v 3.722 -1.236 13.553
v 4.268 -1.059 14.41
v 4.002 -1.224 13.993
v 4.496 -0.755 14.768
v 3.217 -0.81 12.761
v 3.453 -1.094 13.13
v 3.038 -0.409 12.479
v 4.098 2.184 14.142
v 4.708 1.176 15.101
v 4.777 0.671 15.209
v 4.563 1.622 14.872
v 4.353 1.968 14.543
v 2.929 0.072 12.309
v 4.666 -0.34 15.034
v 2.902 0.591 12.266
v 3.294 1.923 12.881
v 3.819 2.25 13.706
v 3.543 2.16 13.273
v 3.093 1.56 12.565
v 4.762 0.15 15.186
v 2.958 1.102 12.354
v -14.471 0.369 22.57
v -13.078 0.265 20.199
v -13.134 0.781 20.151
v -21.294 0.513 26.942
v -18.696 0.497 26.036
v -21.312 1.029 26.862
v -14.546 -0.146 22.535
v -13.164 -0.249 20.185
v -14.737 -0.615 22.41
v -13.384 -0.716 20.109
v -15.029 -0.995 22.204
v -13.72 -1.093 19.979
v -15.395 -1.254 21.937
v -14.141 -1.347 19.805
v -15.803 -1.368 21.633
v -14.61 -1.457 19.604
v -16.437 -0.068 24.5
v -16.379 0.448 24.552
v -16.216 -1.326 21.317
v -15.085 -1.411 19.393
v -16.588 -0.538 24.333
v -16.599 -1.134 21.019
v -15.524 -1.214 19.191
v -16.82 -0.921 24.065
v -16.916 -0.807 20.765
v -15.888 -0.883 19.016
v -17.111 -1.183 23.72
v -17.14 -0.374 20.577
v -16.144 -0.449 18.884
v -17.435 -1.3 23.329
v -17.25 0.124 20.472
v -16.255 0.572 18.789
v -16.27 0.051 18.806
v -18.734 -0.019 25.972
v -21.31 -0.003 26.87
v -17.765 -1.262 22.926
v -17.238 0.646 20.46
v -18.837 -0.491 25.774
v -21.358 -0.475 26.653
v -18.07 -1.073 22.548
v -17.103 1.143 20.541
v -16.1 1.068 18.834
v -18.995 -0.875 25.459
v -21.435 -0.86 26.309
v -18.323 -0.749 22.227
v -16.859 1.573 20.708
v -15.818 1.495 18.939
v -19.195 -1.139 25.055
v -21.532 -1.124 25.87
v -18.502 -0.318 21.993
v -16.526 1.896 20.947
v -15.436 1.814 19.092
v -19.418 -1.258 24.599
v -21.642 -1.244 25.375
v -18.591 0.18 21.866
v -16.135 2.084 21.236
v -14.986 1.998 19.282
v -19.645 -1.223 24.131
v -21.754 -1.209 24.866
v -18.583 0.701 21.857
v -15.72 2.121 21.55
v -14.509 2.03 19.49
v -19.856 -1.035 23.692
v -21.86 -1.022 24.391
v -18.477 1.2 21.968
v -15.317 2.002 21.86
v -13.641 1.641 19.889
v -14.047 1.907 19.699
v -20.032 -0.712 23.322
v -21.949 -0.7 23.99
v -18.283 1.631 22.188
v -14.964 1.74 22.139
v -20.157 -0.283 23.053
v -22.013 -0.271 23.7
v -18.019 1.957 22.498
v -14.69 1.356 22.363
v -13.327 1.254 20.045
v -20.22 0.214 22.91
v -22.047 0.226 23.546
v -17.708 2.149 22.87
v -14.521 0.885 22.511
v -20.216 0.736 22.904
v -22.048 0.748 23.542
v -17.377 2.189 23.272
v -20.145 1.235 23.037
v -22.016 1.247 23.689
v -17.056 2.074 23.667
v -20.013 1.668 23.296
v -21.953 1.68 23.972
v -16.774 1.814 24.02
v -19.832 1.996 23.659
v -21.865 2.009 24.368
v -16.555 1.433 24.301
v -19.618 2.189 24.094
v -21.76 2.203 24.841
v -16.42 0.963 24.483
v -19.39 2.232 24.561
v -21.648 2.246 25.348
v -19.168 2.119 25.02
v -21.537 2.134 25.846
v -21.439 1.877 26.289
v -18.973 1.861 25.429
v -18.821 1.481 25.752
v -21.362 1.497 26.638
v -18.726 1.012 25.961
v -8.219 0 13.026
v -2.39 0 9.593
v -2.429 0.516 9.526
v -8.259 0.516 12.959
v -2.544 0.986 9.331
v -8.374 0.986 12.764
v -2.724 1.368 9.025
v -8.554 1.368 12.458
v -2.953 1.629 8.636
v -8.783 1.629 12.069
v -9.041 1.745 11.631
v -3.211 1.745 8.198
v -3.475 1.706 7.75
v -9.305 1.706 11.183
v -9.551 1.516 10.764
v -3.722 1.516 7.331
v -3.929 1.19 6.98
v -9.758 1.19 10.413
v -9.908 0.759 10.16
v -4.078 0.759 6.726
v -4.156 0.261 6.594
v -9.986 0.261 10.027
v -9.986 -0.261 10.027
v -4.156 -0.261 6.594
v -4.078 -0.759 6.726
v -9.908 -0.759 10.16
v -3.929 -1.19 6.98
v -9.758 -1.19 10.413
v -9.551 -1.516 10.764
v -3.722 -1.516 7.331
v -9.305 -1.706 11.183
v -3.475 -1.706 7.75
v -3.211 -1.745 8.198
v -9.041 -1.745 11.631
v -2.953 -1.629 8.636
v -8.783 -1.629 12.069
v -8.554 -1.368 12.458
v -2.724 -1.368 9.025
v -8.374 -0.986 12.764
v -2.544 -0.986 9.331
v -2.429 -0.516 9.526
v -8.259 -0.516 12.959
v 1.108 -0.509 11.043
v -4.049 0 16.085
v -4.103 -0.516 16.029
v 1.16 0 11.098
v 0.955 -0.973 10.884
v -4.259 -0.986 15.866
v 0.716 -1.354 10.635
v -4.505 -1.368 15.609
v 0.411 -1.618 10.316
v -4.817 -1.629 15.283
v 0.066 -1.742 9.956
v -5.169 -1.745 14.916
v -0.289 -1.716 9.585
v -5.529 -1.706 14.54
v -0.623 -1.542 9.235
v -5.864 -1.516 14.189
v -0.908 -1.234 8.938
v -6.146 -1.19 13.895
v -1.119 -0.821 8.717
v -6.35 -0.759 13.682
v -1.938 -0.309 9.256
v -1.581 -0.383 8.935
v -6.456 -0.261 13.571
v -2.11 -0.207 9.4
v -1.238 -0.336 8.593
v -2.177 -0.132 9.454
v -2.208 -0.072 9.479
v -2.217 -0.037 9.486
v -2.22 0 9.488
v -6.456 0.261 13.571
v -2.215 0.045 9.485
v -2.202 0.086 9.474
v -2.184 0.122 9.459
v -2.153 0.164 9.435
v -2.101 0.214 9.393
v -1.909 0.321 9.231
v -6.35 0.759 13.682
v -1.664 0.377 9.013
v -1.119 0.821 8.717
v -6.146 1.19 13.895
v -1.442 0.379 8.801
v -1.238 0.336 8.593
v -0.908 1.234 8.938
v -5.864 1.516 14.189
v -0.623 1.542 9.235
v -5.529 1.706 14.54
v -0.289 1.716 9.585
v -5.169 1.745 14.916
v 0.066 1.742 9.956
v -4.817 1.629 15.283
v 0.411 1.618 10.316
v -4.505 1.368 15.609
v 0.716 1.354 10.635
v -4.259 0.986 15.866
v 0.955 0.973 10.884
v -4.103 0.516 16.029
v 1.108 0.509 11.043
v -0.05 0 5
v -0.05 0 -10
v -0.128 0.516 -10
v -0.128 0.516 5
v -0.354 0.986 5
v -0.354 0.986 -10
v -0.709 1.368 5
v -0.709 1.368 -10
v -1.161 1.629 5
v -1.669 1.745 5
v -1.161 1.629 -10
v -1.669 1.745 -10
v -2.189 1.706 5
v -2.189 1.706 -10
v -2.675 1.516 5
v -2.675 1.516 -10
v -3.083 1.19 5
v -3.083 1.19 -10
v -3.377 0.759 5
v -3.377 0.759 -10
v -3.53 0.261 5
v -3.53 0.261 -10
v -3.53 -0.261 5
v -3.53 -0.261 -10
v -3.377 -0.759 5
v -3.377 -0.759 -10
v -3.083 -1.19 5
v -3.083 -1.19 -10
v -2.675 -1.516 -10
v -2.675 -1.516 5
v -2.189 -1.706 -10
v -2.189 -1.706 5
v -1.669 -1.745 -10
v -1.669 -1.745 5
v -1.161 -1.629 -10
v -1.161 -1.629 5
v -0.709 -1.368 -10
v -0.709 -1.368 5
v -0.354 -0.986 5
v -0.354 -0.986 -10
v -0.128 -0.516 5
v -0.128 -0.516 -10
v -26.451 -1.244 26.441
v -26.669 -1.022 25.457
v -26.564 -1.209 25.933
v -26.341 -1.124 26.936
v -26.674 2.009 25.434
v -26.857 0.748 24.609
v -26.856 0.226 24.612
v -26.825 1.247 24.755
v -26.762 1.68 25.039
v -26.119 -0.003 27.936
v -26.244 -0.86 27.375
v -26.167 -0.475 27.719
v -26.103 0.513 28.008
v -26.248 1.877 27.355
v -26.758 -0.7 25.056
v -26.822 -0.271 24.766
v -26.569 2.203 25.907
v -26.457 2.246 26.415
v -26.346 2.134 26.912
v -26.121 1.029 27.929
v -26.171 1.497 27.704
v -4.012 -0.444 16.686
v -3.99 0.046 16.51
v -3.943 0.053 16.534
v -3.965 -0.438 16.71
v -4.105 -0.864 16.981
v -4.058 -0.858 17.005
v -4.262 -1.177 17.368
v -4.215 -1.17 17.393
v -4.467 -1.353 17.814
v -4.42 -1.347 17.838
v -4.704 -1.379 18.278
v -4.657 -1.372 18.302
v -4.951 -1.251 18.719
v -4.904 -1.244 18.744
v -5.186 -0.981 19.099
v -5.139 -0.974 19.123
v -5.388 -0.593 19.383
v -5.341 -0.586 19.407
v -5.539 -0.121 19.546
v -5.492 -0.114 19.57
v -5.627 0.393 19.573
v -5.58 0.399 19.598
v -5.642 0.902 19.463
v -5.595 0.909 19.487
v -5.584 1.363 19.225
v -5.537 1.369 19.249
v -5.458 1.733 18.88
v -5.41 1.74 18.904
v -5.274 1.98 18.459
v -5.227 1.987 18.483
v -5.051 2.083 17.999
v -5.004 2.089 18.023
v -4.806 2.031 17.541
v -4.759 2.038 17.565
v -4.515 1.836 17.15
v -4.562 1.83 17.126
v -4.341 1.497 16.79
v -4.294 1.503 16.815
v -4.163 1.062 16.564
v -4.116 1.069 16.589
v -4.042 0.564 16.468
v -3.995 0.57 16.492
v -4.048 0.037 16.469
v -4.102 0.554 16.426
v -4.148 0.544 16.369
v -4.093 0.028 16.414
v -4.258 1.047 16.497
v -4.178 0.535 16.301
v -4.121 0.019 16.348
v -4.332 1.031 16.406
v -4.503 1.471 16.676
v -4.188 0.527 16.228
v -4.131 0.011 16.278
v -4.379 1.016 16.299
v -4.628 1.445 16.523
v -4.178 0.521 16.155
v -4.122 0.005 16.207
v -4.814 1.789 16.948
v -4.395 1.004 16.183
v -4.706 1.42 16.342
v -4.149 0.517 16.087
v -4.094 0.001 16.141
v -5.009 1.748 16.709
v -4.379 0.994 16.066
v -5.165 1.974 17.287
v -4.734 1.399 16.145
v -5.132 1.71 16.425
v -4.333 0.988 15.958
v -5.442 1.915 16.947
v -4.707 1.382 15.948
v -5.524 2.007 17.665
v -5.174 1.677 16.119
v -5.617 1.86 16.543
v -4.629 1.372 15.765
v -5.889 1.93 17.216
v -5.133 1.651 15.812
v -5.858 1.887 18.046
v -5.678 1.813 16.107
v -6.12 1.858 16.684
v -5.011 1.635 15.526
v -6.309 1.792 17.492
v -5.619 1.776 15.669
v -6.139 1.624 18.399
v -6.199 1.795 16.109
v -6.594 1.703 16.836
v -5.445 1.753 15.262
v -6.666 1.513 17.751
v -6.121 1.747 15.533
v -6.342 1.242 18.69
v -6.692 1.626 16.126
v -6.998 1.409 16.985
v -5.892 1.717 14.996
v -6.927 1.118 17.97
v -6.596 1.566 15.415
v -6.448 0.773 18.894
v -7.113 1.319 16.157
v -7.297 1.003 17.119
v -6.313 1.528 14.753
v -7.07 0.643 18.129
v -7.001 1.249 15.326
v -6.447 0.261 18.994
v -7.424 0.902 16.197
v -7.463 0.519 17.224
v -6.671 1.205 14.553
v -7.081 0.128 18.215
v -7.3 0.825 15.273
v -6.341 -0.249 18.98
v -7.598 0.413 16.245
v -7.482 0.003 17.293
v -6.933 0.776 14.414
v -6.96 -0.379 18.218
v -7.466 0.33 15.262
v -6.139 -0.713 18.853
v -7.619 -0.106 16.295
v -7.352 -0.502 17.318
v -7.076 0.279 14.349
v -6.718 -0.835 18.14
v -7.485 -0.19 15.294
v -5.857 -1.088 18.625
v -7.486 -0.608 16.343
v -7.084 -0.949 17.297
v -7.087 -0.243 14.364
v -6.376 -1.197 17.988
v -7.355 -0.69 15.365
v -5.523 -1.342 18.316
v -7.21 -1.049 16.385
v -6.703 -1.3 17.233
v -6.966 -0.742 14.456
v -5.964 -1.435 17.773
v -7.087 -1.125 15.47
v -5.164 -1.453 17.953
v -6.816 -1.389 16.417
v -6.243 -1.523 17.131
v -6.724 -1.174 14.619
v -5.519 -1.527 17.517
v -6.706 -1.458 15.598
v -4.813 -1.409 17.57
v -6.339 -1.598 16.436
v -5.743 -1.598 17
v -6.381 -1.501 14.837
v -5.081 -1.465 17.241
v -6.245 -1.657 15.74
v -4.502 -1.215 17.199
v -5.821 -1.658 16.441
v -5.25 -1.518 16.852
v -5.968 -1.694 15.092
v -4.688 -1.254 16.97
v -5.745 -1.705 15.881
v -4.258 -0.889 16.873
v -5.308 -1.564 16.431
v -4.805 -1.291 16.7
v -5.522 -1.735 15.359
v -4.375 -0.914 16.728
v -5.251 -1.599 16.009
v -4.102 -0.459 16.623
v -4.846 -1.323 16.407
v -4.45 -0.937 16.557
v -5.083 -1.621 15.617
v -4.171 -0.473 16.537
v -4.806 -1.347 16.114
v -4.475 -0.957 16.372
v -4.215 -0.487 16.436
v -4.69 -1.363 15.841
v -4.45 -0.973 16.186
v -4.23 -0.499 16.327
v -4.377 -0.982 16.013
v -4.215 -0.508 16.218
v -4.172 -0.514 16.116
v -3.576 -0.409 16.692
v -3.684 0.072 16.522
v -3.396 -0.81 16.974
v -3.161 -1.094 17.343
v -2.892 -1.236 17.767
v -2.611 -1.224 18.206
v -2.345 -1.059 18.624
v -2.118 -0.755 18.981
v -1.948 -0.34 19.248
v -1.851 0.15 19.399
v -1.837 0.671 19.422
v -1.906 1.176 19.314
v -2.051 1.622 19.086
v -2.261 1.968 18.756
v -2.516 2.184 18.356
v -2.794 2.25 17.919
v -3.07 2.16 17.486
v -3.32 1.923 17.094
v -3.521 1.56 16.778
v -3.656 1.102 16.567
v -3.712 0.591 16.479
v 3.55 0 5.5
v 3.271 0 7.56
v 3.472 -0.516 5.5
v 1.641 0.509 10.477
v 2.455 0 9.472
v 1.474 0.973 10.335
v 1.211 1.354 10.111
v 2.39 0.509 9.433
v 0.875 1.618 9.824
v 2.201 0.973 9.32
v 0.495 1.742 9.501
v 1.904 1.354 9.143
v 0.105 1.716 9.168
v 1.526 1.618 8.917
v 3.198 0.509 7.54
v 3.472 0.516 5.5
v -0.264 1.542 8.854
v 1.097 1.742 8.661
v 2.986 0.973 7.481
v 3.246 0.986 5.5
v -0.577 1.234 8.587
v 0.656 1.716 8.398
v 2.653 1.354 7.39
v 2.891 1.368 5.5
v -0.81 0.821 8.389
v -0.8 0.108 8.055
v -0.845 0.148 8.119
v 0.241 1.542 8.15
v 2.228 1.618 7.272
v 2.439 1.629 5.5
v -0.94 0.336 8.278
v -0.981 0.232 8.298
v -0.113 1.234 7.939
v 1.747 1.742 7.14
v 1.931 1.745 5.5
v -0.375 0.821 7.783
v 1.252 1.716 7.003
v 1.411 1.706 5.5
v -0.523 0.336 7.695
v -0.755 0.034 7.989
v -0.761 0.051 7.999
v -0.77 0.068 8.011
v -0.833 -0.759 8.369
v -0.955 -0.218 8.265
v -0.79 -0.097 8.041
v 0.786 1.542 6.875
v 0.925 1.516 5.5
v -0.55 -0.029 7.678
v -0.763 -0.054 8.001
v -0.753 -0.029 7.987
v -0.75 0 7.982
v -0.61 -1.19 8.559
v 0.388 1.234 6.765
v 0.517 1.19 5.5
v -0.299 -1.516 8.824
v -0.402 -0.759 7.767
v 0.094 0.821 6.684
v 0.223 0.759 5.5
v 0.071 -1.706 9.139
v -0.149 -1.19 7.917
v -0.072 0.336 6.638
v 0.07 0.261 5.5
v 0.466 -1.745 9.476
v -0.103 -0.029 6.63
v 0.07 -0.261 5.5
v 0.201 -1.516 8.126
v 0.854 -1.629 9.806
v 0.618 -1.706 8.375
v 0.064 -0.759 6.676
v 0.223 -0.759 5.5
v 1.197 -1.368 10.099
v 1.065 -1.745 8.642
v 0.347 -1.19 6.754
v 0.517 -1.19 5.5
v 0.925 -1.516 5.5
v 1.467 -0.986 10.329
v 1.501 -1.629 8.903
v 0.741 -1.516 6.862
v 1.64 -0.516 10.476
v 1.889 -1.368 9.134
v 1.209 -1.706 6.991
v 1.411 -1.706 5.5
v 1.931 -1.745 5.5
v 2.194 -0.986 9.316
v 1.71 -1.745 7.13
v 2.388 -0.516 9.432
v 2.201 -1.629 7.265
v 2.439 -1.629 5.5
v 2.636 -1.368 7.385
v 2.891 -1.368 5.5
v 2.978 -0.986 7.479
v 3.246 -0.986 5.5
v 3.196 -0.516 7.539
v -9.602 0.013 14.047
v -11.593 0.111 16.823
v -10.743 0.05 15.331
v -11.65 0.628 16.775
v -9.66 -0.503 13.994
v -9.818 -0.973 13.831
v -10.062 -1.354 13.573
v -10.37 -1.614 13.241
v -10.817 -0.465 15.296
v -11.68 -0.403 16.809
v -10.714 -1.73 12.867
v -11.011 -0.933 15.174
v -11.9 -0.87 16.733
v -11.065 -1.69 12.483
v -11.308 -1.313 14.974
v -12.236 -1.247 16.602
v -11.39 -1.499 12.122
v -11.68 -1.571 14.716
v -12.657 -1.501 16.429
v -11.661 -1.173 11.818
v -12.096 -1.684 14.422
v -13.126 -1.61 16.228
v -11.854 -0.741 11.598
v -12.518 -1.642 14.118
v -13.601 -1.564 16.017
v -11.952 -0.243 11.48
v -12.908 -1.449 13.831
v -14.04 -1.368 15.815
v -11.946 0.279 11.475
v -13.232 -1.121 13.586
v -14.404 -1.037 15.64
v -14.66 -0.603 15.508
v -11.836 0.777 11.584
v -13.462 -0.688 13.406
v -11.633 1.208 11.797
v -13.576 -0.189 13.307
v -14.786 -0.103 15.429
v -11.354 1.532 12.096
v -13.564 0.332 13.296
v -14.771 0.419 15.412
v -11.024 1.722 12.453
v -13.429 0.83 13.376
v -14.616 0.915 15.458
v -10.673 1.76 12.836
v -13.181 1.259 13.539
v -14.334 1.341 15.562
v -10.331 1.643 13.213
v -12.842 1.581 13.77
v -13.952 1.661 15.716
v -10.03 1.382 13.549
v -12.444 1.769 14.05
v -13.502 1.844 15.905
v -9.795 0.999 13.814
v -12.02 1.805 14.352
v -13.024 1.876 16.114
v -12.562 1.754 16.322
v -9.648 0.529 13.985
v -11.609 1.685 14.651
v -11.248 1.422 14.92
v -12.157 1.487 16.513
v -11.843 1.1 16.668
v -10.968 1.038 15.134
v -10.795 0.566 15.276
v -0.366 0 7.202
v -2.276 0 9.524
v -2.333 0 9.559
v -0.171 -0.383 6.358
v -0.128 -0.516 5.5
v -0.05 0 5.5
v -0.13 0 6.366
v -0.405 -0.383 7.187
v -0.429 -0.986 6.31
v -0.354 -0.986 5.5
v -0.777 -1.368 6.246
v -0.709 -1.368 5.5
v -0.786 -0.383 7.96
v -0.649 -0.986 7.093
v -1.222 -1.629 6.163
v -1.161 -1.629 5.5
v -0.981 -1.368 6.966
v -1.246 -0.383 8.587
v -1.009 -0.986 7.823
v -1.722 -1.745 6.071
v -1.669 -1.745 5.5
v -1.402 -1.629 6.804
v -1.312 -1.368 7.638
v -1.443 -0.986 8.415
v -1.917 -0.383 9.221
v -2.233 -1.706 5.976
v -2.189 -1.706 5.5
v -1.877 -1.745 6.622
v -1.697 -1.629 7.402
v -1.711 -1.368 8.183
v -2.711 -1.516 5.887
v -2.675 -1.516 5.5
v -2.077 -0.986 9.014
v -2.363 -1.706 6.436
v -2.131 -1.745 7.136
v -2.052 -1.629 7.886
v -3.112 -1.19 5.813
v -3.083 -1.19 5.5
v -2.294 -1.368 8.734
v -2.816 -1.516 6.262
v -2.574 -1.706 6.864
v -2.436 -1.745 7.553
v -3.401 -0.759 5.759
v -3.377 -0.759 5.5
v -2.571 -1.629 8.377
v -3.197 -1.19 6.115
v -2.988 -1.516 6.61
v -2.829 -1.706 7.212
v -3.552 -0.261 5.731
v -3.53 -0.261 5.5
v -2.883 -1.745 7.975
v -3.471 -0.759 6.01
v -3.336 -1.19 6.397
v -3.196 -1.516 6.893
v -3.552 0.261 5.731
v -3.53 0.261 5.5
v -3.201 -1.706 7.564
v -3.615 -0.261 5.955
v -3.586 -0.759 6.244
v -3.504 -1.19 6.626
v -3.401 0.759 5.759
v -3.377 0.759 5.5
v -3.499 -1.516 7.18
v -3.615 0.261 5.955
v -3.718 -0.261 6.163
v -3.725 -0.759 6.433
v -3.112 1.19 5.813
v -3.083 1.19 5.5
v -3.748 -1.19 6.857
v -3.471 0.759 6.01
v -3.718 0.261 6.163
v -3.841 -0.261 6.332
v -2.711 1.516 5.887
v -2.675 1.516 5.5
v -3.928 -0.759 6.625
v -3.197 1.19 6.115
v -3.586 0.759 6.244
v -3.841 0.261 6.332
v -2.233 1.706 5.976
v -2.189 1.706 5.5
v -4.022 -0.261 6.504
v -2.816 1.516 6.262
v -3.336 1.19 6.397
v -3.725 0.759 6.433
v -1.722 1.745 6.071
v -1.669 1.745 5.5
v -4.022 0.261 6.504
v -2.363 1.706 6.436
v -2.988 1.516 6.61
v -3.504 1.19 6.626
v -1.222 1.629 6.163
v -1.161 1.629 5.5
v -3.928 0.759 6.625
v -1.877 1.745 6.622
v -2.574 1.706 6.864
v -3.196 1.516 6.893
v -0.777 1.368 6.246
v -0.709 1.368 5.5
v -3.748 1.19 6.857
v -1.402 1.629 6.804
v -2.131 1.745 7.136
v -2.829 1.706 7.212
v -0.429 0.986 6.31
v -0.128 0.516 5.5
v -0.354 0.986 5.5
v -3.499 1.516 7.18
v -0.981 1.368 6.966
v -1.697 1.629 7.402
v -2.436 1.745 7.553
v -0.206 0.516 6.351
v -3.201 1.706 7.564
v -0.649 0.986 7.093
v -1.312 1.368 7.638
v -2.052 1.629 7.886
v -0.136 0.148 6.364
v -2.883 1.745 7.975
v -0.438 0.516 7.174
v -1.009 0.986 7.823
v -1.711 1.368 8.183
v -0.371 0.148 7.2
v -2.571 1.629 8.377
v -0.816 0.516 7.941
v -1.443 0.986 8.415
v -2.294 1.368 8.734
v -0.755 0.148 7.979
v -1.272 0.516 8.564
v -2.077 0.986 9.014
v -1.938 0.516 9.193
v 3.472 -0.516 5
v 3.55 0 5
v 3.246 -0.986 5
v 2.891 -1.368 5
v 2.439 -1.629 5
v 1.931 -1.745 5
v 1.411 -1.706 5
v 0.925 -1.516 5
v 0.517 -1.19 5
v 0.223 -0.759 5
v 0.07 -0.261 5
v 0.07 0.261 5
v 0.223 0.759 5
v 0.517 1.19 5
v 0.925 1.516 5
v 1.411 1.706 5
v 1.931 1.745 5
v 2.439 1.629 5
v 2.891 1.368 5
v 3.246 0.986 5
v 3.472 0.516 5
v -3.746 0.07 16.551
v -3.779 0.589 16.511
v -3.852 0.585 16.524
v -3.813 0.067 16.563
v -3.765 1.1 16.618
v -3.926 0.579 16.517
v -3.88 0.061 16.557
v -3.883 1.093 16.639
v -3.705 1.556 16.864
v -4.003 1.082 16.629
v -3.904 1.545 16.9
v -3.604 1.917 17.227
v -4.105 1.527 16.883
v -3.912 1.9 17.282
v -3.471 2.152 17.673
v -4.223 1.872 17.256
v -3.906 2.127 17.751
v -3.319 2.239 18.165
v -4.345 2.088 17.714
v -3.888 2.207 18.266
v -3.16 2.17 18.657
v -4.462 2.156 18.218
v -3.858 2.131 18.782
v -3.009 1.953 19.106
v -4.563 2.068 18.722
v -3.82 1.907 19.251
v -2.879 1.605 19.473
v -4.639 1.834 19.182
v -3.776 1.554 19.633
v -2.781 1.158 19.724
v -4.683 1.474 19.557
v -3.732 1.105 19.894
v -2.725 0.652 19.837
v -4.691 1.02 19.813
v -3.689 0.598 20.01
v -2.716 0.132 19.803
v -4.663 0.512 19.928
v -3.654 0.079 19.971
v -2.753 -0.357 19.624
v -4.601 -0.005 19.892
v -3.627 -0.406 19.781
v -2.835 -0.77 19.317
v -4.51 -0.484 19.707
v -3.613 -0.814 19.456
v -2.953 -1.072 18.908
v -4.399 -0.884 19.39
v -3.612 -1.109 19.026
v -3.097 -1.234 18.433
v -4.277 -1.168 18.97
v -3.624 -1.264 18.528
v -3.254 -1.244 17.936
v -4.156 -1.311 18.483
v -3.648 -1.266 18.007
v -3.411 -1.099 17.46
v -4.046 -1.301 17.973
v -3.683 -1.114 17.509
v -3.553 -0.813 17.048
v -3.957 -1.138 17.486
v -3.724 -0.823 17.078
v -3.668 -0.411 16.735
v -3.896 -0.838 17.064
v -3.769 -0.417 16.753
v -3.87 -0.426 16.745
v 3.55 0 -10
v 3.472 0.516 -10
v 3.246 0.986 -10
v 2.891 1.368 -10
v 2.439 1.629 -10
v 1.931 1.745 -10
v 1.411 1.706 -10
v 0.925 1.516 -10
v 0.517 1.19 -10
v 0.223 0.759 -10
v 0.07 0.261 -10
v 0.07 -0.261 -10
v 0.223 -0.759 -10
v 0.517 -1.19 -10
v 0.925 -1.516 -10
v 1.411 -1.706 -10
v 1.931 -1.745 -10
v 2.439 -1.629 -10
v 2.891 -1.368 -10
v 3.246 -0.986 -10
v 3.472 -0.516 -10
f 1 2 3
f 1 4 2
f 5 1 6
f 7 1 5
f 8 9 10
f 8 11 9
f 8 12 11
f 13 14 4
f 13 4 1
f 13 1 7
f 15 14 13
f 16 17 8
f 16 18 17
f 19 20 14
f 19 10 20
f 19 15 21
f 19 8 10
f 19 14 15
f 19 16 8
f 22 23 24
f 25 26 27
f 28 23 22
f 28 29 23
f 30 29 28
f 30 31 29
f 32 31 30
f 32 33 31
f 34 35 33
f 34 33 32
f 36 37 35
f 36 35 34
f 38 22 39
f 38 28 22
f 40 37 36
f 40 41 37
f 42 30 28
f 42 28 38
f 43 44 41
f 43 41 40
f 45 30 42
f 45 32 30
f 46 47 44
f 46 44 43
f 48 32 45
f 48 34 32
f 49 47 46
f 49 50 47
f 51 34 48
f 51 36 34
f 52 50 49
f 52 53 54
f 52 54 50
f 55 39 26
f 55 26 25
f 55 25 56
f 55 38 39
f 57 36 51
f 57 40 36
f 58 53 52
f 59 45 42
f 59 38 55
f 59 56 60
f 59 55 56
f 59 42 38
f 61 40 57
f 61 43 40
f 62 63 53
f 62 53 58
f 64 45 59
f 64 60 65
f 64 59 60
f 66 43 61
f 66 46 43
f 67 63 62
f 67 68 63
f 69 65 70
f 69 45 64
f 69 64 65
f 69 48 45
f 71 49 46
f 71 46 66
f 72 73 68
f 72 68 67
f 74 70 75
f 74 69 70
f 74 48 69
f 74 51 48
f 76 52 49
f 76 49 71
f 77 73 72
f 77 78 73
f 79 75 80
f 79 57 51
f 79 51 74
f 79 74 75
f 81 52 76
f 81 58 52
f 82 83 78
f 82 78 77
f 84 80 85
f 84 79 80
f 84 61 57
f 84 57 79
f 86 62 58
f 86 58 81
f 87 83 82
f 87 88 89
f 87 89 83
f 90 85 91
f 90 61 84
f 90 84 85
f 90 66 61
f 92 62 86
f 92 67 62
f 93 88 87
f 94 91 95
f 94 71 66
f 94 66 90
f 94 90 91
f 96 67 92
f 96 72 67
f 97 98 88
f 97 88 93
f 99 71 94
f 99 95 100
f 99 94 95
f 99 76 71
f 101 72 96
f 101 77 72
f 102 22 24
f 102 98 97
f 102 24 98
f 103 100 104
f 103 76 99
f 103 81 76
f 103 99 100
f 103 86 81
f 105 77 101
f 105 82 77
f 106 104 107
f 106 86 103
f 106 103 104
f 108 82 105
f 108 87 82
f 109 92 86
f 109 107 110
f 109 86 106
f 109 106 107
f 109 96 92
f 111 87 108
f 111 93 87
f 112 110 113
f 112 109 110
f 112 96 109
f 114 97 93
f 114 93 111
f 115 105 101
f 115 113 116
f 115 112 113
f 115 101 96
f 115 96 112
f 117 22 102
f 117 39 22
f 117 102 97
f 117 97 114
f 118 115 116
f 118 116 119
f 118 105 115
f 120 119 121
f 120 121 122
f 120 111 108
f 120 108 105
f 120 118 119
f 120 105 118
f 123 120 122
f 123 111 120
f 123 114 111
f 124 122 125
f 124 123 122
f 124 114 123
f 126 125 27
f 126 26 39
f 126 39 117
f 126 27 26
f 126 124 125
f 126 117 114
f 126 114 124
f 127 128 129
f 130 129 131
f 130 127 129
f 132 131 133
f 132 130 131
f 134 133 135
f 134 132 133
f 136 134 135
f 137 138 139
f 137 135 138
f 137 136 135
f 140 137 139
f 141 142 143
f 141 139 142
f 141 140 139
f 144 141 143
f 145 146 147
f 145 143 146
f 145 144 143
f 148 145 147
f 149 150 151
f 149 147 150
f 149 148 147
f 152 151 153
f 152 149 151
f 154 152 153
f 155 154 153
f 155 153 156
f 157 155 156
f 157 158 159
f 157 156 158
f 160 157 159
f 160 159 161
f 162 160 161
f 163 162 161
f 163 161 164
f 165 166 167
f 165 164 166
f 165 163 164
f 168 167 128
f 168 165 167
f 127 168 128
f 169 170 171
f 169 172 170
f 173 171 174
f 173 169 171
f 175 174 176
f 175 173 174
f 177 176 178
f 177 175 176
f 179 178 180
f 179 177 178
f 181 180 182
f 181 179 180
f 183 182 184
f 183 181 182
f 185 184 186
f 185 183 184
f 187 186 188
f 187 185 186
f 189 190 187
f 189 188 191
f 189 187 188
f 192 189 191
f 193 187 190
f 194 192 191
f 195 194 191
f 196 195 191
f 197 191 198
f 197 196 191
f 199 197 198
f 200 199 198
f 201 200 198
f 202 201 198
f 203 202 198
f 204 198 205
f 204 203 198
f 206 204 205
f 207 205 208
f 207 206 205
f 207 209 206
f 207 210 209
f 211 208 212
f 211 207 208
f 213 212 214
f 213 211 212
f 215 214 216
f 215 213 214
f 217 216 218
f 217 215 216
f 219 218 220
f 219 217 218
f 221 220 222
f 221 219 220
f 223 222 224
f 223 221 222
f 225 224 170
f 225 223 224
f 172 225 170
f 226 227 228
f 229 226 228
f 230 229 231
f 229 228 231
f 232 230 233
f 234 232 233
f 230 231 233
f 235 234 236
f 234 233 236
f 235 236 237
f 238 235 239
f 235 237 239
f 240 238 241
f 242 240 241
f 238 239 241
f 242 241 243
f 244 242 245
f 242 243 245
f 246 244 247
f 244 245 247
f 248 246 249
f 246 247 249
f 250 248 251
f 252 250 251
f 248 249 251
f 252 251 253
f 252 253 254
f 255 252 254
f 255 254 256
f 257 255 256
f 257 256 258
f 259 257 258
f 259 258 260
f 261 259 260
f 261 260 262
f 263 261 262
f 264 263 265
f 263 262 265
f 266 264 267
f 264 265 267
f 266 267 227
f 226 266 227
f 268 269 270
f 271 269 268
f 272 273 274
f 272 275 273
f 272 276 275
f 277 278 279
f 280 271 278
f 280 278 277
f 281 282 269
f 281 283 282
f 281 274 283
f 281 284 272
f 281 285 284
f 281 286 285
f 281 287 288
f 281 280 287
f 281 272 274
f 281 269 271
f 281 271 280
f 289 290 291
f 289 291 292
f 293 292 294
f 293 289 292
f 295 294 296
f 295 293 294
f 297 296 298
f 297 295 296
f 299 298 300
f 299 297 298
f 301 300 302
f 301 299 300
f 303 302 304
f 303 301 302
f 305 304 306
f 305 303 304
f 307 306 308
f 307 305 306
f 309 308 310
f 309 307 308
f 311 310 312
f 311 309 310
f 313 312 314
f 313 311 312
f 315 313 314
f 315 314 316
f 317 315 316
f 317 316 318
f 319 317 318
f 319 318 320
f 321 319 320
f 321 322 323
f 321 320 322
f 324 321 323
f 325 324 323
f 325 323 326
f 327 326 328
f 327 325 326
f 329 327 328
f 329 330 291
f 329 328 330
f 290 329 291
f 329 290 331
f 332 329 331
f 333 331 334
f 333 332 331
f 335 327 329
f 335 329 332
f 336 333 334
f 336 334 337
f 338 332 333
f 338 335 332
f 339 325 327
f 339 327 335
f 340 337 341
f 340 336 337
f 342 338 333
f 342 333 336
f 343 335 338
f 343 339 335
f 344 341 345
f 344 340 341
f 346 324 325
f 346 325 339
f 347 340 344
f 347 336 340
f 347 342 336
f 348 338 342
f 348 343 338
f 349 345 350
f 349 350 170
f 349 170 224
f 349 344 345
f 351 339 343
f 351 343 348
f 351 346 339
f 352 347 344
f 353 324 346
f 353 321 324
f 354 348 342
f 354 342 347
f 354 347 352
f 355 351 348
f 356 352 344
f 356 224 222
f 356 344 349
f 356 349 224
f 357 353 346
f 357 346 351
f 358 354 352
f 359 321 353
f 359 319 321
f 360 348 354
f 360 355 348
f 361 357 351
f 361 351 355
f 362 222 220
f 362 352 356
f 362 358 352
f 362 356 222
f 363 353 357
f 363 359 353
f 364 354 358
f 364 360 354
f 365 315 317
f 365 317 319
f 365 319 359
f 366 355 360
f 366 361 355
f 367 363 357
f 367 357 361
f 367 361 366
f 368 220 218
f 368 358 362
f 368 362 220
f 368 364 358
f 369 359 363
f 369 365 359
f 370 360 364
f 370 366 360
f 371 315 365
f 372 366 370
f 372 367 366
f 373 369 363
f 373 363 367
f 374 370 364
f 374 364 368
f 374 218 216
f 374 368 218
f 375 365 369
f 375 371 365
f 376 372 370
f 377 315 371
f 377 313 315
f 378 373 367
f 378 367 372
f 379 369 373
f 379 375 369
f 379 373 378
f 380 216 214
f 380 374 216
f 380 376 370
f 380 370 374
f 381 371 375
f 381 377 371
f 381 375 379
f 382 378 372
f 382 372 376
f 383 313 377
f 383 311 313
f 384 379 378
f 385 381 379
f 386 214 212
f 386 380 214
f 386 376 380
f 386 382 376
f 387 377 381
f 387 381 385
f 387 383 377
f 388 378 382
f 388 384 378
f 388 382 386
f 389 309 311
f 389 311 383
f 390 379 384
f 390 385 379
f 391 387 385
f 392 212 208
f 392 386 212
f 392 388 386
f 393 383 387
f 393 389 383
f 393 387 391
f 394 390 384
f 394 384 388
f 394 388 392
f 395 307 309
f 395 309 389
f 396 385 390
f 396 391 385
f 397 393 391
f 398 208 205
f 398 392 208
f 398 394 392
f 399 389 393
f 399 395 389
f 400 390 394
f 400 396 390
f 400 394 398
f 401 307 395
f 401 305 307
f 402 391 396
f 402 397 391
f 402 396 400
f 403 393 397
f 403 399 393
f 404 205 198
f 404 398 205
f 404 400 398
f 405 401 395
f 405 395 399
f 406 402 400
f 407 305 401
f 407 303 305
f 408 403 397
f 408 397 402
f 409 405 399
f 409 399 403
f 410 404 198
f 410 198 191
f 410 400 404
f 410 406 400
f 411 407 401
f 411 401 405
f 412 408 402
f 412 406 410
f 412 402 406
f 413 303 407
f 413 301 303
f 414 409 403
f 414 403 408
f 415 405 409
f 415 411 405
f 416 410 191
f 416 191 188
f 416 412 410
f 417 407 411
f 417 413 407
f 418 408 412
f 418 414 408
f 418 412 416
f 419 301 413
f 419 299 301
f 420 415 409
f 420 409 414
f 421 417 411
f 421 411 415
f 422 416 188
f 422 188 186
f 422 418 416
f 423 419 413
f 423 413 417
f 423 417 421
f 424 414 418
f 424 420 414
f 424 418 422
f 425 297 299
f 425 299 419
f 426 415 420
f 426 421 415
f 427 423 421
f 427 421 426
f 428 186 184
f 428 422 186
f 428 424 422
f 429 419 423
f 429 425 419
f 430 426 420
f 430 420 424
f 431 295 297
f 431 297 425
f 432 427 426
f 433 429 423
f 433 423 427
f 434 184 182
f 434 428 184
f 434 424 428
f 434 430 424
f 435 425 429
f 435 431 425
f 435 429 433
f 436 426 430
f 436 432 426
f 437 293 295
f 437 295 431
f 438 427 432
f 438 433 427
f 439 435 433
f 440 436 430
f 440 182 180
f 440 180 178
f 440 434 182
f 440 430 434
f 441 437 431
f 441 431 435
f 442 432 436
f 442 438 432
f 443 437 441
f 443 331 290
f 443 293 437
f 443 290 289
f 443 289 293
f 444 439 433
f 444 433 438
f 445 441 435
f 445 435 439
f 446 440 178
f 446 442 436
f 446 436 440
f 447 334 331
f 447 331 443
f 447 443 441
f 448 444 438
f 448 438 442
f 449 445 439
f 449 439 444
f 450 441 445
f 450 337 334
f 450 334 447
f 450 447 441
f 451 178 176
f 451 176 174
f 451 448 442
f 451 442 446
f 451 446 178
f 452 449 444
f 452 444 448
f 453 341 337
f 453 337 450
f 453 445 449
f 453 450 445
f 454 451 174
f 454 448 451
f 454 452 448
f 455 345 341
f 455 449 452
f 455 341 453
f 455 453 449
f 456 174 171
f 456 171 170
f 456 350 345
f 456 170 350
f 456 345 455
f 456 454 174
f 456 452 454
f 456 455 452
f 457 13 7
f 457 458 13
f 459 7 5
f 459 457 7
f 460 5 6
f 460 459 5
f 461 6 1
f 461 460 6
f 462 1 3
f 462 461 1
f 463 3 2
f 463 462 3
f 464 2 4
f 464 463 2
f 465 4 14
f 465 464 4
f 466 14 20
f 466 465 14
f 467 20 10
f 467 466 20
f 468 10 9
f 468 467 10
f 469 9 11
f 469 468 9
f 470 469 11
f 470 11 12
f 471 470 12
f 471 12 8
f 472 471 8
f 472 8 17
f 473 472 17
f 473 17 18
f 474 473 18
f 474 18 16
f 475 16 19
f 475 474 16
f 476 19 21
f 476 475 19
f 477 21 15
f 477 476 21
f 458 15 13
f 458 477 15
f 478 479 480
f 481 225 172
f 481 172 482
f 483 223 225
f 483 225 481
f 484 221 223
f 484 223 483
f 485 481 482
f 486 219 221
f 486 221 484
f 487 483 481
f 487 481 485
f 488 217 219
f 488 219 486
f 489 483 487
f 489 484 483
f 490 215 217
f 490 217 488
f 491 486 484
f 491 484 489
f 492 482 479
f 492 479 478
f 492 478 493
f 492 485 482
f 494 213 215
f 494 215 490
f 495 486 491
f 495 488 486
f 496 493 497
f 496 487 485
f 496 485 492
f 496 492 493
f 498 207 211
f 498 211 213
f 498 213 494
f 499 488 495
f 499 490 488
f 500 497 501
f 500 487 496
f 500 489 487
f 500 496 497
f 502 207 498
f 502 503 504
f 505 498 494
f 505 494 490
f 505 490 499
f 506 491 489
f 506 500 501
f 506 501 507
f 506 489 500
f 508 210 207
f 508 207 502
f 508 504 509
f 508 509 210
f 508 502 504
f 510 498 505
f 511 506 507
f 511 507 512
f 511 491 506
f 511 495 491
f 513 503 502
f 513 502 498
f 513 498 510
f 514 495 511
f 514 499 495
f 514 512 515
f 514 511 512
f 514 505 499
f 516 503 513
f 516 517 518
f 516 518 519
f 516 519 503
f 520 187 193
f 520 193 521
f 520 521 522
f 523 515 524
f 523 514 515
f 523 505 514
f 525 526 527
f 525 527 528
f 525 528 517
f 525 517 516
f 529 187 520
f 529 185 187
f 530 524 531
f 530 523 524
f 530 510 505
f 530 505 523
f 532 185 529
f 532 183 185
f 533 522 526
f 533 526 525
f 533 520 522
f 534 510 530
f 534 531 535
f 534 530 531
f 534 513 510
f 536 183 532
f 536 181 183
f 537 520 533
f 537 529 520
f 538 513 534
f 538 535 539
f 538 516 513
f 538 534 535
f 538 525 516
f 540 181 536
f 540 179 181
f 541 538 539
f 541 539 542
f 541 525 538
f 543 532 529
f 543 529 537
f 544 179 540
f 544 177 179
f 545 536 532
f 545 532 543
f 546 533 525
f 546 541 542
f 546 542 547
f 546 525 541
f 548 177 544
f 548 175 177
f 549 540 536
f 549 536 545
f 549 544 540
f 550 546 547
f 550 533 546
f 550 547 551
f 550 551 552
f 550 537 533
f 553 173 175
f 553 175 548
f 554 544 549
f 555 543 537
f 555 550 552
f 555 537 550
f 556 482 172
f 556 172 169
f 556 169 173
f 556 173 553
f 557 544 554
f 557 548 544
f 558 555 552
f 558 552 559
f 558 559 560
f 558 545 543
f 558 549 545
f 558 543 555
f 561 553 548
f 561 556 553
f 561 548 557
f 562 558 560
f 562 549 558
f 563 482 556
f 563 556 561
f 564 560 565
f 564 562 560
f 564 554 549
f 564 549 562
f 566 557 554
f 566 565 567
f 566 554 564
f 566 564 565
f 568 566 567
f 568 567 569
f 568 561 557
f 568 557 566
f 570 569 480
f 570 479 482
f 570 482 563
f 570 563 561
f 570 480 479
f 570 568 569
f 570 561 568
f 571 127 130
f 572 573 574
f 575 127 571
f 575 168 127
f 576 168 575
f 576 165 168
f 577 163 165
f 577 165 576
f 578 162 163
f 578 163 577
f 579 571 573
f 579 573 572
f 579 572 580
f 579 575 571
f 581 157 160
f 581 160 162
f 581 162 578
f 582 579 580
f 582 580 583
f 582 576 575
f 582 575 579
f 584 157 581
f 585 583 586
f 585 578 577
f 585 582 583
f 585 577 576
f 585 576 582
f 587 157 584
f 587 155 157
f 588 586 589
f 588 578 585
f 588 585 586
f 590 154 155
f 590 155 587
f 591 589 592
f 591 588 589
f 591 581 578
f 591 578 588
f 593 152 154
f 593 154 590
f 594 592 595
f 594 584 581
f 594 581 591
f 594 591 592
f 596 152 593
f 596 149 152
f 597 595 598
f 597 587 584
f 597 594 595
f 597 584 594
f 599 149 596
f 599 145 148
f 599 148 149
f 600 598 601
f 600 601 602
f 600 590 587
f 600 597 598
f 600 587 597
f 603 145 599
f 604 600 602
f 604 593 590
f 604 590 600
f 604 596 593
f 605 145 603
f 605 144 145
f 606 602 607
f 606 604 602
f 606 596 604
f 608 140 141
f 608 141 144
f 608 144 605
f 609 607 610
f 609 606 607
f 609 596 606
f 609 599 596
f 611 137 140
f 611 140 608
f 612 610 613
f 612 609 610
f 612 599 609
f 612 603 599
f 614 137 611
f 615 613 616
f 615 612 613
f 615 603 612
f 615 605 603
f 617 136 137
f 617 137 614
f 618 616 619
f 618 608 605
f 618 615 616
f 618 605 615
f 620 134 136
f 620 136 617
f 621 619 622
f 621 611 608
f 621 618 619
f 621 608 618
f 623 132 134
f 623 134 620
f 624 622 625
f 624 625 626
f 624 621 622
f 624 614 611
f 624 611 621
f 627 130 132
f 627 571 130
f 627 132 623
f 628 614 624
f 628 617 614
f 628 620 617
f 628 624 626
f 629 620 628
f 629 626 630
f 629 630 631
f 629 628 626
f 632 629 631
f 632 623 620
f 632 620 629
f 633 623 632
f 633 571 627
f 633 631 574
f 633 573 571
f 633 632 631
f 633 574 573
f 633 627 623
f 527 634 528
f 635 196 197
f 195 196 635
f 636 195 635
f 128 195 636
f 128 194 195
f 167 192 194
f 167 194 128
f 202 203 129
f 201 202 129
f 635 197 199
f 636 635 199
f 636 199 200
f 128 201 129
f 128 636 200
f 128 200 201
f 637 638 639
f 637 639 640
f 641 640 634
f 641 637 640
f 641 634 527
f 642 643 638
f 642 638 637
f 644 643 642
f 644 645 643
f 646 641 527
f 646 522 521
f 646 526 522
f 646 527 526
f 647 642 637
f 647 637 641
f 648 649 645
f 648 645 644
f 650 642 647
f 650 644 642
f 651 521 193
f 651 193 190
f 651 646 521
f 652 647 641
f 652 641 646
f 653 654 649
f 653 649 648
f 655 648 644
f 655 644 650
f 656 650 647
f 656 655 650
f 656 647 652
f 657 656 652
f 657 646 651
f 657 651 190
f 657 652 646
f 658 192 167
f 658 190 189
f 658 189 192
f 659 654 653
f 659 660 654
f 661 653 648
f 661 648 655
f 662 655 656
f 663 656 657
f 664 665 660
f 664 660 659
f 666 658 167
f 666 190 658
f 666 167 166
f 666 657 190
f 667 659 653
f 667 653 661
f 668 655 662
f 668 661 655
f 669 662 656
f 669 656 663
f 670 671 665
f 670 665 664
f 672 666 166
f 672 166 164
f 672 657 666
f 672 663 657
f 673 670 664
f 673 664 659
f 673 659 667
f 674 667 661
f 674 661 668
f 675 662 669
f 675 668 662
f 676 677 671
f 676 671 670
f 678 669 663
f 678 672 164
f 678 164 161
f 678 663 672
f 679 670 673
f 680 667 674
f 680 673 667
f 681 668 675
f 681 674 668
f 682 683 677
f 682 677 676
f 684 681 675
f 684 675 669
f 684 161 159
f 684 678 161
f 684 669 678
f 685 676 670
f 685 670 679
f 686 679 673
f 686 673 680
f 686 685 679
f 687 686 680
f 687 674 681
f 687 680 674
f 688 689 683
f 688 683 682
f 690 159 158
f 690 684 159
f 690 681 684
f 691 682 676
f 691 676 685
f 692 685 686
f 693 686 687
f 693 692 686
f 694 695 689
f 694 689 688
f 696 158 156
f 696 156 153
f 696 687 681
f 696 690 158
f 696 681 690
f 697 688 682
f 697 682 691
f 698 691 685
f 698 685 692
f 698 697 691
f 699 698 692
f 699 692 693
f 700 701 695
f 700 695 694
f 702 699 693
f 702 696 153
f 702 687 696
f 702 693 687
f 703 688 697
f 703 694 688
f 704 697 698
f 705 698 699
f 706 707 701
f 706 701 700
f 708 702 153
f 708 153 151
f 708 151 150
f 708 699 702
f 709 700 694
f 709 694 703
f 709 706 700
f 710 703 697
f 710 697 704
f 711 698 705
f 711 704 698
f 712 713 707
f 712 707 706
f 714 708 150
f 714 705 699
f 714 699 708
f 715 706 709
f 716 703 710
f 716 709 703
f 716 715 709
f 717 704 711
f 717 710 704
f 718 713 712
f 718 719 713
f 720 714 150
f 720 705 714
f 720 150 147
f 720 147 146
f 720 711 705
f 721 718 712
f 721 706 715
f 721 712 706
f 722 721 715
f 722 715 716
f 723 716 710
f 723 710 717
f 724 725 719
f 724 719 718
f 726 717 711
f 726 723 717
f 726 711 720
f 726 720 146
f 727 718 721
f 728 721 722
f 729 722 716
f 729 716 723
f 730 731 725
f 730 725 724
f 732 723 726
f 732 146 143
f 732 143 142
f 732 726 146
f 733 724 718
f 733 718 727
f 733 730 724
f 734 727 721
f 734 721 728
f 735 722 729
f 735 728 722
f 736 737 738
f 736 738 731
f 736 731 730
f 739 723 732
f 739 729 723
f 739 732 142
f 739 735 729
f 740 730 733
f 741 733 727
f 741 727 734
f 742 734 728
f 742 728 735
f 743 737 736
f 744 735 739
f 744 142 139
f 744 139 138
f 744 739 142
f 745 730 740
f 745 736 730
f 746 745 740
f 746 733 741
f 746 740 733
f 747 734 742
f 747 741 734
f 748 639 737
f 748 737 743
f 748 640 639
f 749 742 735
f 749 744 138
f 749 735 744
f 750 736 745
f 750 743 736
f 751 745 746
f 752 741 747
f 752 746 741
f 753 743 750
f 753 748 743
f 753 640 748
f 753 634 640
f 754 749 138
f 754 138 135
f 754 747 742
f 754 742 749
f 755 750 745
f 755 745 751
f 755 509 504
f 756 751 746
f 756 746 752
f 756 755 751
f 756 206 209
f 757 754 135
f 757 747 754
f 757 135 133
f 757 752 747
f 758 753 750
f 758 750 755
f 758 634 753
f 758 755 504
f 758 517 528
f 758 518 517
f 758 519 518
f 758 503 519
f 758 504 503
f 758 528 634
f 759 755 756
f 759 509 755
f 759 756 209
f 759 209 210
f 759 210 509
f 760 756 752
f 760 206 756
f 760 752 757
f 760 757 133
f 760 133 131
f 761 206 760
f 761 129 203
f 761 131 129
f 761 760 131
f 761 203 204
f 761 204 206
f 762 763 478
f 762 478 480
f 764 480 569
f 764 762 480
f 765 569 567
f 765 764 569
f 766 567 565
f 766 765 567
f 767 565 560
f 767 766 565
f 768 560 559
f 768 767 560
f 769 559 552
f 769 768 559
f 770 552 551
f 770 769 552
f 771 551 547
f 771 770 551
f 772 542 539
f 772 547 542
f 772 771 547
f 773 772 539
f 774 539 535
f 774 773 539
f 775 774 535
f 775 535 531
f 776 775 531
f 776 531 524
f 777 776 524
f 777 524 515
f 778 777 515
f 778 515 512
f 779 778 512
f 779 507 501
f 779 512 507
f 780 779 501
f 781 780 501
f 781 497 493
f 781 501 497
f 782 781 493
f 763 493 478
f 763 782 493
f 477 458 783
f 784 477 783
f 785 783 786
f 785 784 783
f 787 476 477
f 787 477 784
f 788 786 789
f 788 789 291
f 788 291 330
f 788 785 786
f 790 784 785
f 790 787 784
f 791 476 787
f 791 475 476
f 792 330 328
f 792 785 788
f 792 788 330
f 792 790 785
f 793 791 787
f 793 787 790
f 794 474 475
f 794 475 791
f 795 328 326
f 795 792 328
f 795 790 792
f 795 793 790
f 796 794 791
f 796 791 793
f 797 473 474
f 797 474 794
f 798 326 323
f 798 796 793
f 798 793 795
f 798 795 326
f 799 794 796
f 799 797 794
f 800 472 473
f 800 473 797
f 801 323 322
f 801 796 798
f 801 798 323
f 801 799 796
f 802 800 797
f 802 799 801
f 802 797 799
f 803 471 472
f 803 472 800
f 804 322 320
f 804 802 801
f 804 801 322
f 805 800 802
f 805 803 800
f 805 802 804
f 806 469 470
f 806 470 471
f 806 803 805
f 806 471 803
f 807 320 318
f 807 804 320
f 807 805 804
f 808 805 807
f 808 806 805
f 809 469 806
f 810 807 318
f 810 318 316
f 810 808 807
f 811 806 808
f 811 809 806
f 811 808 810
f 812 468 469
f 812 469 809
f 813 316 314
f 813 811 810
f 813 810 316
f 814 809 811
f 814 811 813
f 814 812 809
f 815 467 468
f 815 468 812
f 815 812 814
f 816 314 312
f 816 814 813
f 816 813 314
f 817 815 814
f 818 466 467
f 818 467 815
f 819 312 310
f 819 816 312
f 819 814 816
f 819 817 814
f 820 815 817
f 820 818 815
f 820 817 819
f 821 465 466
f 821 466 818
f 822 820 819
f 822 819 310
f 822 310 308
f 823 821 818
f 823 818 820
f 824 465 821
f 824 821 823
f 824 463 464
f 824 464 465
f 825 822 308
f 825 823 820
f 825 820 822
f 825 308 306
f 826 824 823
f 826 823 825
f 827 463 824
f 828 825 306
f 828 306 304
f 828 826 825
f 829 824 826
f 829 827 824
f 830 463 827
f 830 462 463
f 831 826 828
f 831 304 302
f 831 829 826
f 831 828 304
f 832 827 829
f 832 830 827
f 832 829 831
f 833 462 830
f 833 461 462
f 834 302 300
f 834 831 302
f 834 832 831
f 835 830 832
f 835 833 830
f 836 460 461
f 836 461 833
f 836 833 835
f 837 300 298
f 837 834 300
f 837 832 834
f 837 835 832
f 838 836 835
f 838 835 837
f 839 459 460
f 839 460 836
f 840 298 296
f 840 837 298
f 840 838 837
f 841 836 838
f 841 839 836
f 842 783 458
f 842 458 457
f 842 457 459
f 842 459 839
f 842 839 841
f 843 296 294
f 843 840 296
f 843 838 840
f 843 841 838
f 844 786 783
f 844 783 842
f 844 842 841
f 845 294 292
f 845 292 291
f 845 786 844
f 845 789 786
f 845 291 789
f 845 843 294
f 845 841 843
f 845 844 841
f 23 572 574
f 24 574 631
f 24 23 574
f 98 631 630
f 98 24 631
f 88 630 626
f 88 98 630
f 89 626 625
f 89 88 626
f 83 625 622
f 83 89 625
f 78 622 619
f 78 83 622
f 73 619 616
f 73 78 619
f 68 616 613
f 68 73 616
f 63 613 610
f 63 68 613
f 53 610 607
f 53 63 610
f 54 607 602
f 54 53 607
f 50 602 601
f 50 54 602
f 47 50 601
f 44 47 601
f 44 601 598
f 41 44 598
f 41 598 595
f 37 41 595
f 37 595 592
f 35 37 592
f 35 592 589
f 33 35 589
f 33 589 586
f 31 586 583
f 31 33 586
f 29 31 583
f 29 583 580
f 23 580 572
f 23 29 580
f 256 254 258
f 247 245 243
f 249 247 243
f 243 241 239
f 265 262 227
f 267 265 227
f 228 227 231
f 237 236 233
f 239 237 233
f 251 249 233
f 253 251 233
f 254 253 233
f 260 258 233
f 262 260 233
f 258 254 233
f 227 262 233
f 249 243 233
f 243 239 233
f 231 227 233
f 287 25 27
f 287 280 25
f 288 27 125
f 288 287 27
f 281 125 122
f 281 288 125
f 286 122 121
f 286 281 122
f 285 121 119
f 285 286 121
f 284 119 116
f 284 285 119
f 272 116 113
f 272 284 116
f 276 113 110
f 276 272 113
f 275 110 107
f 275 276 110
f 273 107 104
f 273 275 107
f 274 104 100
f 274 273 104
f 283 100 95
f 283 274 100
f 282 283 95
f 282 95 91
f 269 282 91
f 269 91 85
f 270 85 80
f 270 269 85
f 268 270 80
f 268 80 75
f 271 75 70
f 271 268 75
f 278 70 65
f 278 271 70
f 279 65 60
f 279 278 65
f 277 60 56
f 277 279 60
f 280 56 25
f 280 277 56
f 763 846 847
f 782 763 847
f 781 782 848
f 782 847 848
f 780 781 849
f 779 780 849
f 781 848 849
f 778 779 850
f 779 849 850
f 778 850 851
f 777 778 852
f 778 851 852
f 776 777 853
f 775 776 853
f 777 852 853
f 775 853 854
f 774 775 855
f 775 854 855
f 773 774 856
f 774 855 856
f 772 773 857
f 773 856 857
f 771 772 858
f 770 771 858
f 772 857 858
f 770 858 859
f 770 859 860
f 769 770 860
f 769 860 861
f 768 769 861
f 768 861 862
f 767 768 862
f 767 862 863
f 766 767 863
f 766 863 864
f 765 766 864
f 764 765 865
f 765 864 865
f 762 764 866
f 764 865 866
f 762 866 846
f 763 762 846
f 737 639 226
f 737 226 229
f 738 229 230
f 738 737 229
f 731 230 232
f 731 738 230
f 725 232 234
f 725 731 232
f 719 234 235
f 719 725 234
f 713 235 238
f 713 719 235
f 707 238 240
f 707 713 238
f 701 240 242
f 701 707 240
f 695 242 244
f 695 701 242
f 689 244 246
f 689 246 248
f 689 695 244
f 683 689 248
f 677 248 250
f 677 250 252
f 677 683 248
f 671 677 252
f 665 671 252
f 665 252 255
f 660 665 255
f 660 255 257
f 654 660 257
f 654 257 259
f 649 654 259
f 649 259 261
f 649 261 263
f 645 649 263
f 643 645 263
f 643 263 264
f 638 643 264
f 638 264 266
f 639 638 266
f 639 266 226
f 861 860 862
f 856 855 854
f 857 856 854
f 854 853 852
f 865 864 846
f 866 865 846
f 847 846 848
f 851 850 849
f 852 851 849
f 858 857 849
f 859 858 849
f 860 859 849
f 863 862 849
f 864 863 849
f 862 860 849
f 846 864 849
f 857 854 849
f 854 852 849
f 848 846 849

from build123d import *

# Parameters (mm, degrees)
BOSS_EXTRU_1_DEPTH        = 5
BOSS_EXTRU_1_DEPTH_BACK   = 10
ESQUISSE1_R               = 1.75
BOSS_EXTRU_1_2_DEPTH      = 5
BOSS_EXTRU_1_2_DEPTH_BACK = 10
ESQUISSE2_R               = 1.75
ESQUISSE3_R               = 1.75
ENL_V_MAT_EXTRU_1_DEPTH   = 3
ESQUISSE4_R               = 1.75
ESQUISSE5_R               = 1.75
ENL_V_MAT_EXTRU_2_DEPTH   = 3


with BuildPart() as part:
    # Esquisse1 → Boss.-Extru.1 (new, two sides: drawn at the far end of the back side and taken through both)
    with BuildSketch(Plane.XY.offset(-BOSS_EXTRU_1_DEPTH_BACK)):
        with Locations((-1.8, 0)):
            Circle(ESQUISSE1_R)
    extrude(amount=BOSS_EXTRU_1_DEPTH + BOSS_EXTRU_1_DEPTH_BACK)



with BuildPart() as body_2:
    # Esquisse1 → Boss.-Extru.1 2 (new, two sides: drawn at the far end of the back side and taken through both)
    with BuildSketch(Plane.XY.offset(-BOSS_EXTRU_1_2_DEPTH_BACK)):
        with Locations((1.8, 0)):
            Circle(ESQUISSE1_R)
    extrude(amount=BOSS_EXTRU_1_2_DEPTH + BOSS_EXTRU_1_2_DEPTH_BACK)

    # Balayage1: sweep along a curve in space
    with BuildLine() as balayage1_path:
        Line((1.8, 0, 5.5), (1.8, 0, 5))
        ThreePointArc((-0.050422137, 0, 9.833705523), (1.318037114, 0, 7.856112563), (1.8, 0, 5.5))
        Line((-0.050422137, 0, 9.833705523), (-5.259213711, 0, 14.821189351))
        ThreePointArc((-4.816825334, 0.348555806, 18.022401208), (-5.861081542, 0.11010529, 16.542524811), (-5.259213711, 0, 14.821189351))
        Line((-4.816825334, 0.348555806, 18.022401208), (-4.769816548, 0.355226106, 18.046757443))
        ThreePointArc((-2.772717213, 0.5, 17.953095794), (-3.761180865, 0.461194336, 18.266892532), (-4.769816548, 0.355226106, 18.046757443))
        Line((6.371171623, 0.5, 12.127796149), (-2.772717213, 0.5, 17.953095794))
    # Esquisse2 → Balayage1 (sweep)
    with BuildSketch(Plane.XY.offset(5)):
        with Locations((1.8, 0)):
            Circle(ESQUISSE2_R)
    sweep(path=balayage1_path.line)

    # Esquisse3 → Enlèv. mat.-Extru.1 (cut)
    with BuildSketch(Plane(origin=(-0.963885494, 0, 0.614062783), x_dir=(-0.5372996083468307, 1.153766929709301e-15, -0.8433914458128813), z_dir=(0.8433914458128813, -1.8110513089197862e-15, -0.5372996083468307))):
        with Locations((-13.651707546, 0.5)):
            Circle(ESQUISSE3_R)
    extrude(amount=-ENL_V_MAT_EXTRU_1_DEPTH, mode=Mode.SUBTRACT)


with BuildPart() as part_1:
    add(part.part)

    add(body_2.part)  # Balayage2 merges body 2
    # Balayage2: sweep along a curve in space
    with BuildLine() as balayage2_path:
        Line((-1.8, 0, 5), (-1.8, 0, 5.5))
        ThreePointArc((-3.277669531, 0, 8.085055114), (-2.195485515, 0, 6.988792899), (-1.8, 0, 5.5))
        Line((-3.277669531, 0, 8.085055114), (-9.10744265, 0, 11.518189362))
        ThreePointArc((-13.19492784, 0.134768754, 16.117942999), (-11.513609411, 0.034530095, 13.496967314), (-9.10744265, 0, 11.518189362))
        Line((-14.679034762, 0.288575292, 19.494314724), (-13.19492784, 0.134768754, 16.117942999))
        ThreePointArc((-21.673024109, 0.5, 25.233780857), (-17.489247519, 0.444119723, 23.199109722), (-14.679034762, 0.288575292, 19.494314724))
        Line((-29.410957851, 0.5, 26.949239467), (-21.673024109, 0.5, 25.233780857))
    # Esquisse4 → Balayage2 (sweep)
    with BuildSketch(Plane.XY.offset(5)):
        with Locations((-1.8, 0)):
            Circle(ESQUISSE4_R)
    sweep(path=balayage2_path.line)

    # Esquisse5 → Enlèv. mat.-Extru.2 (cut)
    with BuildSketch(Plane(origin=(-33.727789357, 0, 7.477270883), x_dir=(0.21643961393810765, 0, 0.9762960071199323), z_dir=(-0.9762960071199324, 0, 0.21643961393810768))):
        with Locations((19.944738524, 0.5)):
            Circle(ESQUISSE5_R)
    extrude(amount=-ENL_V_MAT_EXTRU_2_DEPTH, mode=Mode.SUBTRACT)


solid = part_1.part
